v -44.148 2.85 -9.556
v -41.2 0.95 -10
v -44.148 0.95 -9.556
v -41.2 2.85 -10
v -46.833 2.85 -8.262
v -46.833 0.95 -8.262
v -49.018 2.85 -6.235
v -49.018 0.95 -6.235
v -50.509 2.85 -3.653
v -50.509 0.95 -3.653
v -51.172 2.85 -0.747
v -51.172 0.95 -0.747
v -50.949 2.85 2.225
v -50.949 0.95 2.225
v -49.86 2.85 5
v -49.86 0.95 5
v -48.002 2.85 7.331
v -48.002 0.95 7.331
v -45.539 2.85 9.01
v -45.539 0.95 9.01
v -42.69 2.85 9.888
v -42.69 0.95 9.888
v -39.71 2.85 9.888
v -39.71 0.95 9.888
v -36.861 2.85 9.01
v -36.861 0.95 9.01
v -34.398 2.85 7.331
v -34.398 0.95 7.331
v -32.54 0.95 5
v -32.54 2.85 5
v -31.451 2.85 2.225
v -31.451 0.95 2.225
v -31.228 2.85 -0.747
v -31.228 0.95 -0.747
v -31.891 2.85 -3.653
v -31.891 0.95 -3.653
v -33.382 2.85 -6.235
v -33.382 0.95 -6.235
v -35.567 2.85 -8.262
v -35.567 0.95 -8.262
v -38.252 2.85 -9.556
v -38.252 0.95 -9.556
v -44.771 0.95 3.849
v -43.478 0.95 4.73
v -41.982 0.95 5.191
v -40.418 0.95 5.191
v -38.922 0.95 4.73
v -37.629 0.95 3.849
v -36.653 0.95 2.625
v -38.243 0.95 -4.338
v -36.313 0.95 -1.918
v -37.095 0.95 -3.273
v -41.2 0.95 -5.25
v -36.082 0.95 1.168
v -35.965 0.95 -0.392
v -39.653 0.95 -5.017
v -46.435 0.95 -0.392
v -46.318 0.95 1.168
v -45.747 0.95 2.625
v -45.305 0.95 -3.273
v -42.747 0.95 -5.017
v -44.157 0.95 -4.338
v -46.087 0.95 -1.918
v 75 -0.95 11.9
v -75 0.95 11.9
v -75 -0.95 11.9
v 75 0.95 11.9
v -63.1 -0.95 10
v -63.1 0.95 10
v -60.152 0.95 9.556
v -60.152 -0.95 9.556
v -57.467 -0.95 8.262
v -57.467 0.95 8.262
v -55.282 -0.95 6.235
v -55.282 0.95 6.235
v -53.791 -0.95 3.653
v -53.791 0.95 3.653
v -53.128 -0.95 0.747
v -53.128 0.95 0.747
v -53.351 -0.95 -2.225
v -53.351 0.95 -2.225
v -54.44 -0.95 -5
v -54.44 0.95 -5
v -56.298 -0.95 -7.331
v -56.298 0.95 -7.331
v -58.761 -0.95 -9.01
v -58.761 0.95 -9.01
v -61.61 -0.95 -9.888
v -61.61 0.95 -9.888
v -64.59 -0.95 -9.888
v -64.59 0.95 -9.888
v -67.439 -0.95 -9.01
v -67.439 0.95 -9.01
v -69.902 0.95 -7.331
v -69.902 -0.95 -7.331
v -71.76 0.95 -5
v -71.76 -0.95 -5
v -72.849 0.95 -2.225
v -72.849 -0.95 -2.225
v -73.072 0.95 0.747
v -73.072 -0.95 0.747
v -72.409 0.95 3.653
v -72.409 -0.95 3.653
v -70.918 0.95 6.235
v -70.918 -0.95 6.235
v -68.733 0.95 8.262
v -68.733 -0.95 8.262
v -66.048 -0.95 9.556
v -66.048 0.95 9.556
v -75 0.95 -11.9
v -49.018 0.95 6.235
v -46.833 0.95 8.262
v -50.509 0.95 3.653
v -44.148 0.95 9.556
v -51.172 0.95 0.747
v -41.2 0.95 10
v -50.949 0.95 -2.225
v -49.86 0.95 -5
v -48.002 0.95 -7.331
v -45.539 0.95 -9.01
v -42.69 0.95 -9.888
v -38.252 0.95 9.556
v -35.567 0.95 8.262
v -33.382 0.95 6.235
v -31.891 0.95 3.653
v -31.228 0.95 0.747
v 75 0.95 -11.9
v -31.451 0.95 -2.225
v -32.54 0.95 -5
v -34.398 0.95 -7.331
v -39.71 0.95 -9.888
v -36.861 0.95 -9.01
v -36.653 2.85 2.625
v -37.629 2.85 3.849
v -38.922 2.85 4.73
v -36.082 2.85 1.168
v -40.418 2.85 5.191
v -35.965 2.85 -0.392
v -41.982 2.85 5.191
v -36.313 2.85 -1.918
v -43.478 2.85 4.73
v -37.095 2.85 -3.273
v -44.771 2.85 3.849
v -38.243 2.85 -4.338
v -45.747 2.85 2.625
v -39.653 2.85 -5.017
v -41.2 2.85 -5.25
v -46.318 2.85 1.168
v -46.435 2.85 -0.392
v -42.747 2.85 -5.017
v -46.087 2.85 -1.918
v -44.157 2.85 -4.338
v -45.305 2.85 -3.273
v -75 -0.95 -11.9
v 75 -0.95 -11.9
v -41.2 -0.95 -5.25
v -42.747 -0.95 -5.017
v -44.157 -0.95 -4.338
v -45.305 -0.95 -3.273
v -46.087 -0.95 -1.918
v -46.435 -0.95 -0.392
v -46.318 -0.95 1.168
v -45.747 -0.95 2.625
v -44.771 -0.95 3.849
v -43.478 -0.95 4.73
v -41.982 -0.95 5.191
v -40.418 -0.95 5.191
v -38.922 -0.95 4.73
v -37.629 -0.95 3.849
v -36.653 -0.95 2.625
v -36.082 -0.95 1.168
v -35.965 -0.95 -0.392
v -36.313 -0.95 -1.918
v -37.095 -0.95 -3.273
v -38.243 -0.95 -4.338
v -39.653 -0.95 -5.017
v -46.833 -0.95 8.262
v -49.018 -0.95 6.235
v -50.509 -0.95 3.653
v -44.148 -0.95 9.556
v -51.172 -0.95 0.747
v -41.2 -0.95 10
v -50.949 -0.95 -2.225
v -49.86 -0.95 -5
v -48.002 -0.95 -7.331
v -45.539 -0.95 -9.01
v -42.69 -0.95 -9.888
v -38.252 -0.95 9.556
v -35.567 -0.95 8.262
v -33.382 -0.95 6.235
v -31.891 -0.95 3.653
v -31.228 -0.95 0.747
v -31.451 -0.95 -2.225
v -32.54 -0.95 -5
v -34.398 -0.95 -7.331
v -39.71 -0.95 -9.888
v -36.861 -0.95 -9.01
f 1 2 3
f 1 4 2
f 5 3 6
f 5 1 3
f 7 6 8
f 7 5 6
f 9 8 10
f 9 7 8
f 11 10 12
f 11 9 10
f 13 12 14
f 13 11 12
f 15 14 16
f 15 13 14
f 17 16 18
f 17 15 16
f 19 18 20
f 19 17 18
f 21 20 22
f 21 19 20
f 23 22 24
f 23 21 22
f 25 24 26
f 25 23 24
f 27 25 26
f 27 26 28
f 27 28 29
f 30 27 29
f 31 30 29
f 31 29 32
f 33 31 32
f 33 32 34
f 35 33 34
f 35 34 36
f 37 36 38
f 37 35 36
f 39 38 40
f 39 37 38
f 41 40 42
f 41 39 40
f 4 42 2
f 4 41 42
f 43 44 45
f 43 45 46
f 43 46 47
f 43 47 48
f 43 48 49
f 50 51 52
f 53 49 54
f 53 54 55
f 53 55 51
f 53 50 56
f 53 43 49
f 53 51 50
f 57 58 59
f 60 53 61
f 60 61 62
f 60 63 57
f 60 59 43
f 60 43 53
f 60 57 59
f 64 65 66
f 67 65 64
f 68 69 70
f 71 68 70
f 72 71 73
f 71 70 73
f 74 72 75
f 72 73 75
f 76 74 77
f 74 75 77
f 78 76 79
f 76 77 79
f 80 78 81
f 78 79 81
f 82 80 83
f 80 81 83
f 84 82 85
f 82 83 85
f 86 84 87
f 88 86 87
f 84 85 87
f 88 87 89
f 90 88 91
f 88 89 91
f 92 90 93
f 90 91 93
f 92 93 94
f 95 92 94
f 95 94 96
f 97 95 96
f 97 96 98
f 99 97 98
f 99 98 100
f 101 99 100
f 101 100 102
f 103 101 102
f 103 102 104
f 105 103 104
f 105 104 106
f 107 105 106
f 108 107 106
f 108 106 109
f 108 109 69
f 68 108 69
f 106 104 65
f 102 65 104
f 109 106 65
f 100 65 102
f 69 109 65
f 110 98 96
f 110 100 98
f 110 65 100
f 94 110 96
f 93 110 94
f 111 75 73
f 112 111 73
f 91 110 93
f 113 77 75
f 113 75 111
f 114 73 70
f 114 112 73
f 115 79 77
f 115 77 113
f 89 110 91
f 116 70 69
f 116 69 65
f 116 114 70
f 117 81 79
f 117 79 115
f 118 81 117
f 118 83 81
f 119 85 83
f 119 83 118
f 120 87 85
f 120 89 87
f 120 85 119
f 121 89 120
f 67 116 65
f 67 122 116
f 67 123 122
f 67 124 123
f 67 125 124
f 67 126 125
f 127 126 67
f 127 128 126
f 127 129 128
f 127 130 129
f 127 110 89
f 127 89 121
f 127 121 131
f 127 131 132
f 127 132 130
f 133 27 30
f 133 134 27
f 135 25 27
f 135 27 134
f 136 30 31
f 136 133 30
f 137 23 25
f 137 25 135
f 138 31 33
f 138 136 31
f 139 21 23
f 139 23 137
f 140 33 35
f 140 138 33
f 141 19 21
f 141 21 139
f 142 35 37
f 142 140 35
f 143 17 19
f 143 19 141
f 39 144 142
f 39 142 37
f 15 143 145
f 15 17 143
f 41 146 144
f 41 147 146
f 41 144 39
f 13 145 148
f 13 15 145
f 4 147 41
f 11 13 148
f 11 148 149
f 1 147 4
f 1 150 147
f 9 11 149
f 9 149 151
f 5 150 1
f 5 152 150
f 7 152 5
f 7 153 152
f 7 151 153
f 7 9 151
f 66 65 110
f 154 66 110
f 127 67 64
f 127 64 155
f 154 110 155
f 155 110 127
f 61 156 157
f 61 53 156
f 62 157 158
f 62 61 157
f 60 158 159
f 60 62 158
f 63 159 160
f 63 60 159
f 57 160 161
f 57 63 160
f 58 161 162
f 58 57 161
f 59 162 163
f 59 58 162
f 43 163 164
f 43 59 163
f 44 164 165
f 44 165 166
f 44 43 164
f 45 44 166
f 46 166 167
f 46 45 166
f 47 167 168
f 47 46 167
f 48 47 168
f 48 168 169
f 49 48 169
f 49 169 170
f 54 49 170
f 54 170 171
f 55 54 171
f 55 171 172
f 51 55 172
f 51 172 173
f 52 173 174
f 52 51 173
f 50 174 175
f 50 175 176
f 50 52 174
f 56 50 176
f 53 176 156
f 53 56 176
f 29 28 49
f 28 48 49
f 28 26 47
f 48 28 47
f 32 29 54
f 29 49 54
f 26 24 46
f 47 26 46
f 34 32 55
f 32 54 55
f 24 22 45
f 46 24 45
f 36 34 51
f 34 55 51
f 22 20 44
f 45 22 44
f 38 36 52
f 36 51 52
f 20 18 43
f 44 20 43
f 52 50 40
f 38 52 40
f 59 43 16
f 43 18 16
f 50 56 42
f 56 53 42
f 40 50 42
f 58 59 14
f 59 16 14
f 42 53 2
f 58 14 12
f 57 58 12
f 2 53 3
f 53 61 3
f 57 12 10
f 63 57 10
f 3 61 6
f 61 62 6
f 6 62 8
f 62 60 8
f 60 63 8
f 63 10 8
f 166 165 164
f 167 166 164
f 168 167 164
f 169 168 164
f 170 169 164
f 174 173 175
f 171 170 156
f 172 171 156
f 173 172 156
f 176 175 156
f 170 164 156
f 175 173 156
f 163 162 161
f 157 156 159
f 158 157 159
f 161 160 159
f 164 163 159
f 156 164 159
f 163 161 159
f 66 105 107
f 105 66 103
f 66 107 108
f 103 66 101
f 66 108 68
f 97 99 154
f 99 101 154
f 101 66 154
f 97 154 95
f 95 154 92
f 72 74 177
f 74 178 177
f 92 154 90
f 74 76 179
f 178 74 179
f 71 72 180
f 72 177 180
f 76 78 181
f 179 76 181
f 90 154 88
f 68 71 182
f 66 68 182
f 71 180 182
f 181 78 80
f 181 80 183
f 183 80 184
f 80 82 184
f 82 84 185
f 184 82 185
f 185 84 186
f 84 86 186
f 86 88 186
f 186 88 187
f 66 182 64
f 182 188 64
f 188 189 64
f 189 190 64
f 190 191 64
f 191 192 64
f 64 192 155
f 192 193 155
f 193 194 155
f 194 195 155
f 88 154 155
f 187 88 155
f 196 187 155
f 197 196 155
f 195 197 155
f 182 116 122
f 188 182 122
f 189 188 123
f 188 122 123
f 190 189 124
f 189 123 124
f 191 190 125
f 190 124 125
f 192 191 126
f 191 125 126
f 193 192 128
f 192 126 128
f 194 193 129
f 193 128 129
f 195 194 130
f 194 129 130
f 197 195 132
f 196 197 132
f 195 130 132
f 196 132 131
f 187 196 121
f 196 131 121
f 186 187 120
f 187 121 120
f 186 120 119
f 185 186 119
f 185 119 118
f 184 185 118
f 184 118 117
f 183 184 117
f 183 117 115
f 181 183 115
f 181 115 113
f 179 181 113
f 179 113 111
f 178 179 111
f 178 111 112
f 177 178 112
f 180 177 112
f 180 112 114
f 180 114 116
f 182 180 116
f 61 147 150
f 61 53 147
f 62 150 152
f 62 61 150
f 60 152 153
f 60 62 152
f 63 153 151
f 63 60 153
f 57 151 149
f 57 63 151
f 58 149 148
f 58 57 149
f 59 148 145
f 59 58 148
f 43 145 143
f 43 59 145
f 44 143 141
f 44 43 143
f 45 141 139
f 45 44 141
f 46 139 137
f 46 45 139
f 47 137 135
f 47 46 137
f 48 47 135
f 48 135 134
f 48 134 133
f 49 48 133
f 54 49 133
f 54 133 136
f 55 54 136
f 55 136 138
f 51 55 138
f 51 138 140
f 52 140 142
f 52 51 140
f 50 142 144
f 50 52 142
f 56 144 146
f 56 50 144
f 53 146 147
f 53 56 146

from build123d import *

# Parameters (mm, degrees)
SKETCH1_W           = 150
SKETCH1_H           = 23.8
BOSS_EXTRUDE1_DEPTH = 0.95
CUT_EXTRUDE2_REACH  = 77.962
SKETCH6_R           = 10
CUT_EXTRUDE1_REACH  = 77.962
SKETCH3_R           = 10
SKETCH4_R           = 10
SKETCH4_R_2         = 5.25
BOSS_EXTRUDE3_DEPTH = 0.95
SKETCH5_R           = 5.25
BOSS_EXTRUDE4_DEPTH = 0.95


with BuildPart() as part:
    # Sketch1 → Boss-Extrude1 (new, symmetric)
    with BuildSketch(Plane(origin=(0, 0, 0), x_dir=(1, 0, 0), z_dir=(0, 1, 0))):
        Rectangle(SKETCH1_W, SKETCH1_H)
    extrude(amount=BOSS_EXTRUDE1_DEPTH, both=True)

    # Sketch6 → Cut-Extrude2 (cut, up to next)
    with BuildSketch(Plane(origin=(0, 0.95, 0), x_dir=(1, 0, 0), z_dir=(0, 1, 0)), mode=Mode.PRIVATE) as cut_extrude2_sk1:
        with Locations(Location((-63.1, 0, 0), (0, 0, 270))):
            Circle(SKETCH6_R)
    cut_extrude2_tool1 = extrude(cut_extrude2_sk1.sketch, amount=-CUT_EXTRUDE2_REACH, mode=Mode.PRIVATE) & part.part
    add(cut_extrude2_tool1.solids().sort_by_distance((-63.1, 0.95, 0))[0], mode=Mode.SUBTRACT)

    # Sketch3 → Cut-Extrude1 (cut, up to next)
    with BuildSketch(Plane(origin=(0, 0.95, 0), x_dir=(1, 0, 0), z_dir=(0, 1, 0)), mode=Mode.PRIVATE) as cut_extrude1_sk1:
        with Locations(Location((-41.2, 0, 0), (0, 0, 270))):
            Circle(SKETCH3_R)
    cut_extrude1_tool1 = extrude(cut_extrude1_sk1.sketch, amount=-CUT_EXTRUDE1_REACH, mode=Mode.PRIVATE) & part.part
    add(cut_extrude1_tool1.solids().sort_by_distance((-41.2, 0.95, 0))[0], mode=Mode.SUBTRACT)


with BuildPart() as body_2:
    # Sketch4 → Boss-Extrude3 (new, symmetric)
    with BuildSketch(Plane(origin=(0, 1.9, 0), x_dir=(1, 0, 0), z_dir=(0, 1, 0))):
        with Locations(Location((-41.2, 0, 0), (0, 0, 90))):
            Circle(SKETCH4_R)
        with Locations(Location((-41.2, 0, 0), (0, 0, 90))):
            Circle(SKETCH4_R_2, mode=Mode.SUBTRACT)
    extrude(amount=BOSS_EXTRUDE3_DEPTH, both=True)


with BuildPart() as body_3:
    # Sketch5 → Boss-Extrude4 (new, symmetric)
    with BuildSketch(Plane(origin=(0, 0, 0), x_dir=(1, 0, 0), z_dir=(0, 1, 0))):
        with Locations(Location((-41.2, 0, 0), (0, 0, 90))):
            Circle(SKETCH5_R)
    extrude(amount=BOSS_EXTRUDE4_DEPTH, both=True)


solid = Compound([part.part, body_2.part, body_3.part])
